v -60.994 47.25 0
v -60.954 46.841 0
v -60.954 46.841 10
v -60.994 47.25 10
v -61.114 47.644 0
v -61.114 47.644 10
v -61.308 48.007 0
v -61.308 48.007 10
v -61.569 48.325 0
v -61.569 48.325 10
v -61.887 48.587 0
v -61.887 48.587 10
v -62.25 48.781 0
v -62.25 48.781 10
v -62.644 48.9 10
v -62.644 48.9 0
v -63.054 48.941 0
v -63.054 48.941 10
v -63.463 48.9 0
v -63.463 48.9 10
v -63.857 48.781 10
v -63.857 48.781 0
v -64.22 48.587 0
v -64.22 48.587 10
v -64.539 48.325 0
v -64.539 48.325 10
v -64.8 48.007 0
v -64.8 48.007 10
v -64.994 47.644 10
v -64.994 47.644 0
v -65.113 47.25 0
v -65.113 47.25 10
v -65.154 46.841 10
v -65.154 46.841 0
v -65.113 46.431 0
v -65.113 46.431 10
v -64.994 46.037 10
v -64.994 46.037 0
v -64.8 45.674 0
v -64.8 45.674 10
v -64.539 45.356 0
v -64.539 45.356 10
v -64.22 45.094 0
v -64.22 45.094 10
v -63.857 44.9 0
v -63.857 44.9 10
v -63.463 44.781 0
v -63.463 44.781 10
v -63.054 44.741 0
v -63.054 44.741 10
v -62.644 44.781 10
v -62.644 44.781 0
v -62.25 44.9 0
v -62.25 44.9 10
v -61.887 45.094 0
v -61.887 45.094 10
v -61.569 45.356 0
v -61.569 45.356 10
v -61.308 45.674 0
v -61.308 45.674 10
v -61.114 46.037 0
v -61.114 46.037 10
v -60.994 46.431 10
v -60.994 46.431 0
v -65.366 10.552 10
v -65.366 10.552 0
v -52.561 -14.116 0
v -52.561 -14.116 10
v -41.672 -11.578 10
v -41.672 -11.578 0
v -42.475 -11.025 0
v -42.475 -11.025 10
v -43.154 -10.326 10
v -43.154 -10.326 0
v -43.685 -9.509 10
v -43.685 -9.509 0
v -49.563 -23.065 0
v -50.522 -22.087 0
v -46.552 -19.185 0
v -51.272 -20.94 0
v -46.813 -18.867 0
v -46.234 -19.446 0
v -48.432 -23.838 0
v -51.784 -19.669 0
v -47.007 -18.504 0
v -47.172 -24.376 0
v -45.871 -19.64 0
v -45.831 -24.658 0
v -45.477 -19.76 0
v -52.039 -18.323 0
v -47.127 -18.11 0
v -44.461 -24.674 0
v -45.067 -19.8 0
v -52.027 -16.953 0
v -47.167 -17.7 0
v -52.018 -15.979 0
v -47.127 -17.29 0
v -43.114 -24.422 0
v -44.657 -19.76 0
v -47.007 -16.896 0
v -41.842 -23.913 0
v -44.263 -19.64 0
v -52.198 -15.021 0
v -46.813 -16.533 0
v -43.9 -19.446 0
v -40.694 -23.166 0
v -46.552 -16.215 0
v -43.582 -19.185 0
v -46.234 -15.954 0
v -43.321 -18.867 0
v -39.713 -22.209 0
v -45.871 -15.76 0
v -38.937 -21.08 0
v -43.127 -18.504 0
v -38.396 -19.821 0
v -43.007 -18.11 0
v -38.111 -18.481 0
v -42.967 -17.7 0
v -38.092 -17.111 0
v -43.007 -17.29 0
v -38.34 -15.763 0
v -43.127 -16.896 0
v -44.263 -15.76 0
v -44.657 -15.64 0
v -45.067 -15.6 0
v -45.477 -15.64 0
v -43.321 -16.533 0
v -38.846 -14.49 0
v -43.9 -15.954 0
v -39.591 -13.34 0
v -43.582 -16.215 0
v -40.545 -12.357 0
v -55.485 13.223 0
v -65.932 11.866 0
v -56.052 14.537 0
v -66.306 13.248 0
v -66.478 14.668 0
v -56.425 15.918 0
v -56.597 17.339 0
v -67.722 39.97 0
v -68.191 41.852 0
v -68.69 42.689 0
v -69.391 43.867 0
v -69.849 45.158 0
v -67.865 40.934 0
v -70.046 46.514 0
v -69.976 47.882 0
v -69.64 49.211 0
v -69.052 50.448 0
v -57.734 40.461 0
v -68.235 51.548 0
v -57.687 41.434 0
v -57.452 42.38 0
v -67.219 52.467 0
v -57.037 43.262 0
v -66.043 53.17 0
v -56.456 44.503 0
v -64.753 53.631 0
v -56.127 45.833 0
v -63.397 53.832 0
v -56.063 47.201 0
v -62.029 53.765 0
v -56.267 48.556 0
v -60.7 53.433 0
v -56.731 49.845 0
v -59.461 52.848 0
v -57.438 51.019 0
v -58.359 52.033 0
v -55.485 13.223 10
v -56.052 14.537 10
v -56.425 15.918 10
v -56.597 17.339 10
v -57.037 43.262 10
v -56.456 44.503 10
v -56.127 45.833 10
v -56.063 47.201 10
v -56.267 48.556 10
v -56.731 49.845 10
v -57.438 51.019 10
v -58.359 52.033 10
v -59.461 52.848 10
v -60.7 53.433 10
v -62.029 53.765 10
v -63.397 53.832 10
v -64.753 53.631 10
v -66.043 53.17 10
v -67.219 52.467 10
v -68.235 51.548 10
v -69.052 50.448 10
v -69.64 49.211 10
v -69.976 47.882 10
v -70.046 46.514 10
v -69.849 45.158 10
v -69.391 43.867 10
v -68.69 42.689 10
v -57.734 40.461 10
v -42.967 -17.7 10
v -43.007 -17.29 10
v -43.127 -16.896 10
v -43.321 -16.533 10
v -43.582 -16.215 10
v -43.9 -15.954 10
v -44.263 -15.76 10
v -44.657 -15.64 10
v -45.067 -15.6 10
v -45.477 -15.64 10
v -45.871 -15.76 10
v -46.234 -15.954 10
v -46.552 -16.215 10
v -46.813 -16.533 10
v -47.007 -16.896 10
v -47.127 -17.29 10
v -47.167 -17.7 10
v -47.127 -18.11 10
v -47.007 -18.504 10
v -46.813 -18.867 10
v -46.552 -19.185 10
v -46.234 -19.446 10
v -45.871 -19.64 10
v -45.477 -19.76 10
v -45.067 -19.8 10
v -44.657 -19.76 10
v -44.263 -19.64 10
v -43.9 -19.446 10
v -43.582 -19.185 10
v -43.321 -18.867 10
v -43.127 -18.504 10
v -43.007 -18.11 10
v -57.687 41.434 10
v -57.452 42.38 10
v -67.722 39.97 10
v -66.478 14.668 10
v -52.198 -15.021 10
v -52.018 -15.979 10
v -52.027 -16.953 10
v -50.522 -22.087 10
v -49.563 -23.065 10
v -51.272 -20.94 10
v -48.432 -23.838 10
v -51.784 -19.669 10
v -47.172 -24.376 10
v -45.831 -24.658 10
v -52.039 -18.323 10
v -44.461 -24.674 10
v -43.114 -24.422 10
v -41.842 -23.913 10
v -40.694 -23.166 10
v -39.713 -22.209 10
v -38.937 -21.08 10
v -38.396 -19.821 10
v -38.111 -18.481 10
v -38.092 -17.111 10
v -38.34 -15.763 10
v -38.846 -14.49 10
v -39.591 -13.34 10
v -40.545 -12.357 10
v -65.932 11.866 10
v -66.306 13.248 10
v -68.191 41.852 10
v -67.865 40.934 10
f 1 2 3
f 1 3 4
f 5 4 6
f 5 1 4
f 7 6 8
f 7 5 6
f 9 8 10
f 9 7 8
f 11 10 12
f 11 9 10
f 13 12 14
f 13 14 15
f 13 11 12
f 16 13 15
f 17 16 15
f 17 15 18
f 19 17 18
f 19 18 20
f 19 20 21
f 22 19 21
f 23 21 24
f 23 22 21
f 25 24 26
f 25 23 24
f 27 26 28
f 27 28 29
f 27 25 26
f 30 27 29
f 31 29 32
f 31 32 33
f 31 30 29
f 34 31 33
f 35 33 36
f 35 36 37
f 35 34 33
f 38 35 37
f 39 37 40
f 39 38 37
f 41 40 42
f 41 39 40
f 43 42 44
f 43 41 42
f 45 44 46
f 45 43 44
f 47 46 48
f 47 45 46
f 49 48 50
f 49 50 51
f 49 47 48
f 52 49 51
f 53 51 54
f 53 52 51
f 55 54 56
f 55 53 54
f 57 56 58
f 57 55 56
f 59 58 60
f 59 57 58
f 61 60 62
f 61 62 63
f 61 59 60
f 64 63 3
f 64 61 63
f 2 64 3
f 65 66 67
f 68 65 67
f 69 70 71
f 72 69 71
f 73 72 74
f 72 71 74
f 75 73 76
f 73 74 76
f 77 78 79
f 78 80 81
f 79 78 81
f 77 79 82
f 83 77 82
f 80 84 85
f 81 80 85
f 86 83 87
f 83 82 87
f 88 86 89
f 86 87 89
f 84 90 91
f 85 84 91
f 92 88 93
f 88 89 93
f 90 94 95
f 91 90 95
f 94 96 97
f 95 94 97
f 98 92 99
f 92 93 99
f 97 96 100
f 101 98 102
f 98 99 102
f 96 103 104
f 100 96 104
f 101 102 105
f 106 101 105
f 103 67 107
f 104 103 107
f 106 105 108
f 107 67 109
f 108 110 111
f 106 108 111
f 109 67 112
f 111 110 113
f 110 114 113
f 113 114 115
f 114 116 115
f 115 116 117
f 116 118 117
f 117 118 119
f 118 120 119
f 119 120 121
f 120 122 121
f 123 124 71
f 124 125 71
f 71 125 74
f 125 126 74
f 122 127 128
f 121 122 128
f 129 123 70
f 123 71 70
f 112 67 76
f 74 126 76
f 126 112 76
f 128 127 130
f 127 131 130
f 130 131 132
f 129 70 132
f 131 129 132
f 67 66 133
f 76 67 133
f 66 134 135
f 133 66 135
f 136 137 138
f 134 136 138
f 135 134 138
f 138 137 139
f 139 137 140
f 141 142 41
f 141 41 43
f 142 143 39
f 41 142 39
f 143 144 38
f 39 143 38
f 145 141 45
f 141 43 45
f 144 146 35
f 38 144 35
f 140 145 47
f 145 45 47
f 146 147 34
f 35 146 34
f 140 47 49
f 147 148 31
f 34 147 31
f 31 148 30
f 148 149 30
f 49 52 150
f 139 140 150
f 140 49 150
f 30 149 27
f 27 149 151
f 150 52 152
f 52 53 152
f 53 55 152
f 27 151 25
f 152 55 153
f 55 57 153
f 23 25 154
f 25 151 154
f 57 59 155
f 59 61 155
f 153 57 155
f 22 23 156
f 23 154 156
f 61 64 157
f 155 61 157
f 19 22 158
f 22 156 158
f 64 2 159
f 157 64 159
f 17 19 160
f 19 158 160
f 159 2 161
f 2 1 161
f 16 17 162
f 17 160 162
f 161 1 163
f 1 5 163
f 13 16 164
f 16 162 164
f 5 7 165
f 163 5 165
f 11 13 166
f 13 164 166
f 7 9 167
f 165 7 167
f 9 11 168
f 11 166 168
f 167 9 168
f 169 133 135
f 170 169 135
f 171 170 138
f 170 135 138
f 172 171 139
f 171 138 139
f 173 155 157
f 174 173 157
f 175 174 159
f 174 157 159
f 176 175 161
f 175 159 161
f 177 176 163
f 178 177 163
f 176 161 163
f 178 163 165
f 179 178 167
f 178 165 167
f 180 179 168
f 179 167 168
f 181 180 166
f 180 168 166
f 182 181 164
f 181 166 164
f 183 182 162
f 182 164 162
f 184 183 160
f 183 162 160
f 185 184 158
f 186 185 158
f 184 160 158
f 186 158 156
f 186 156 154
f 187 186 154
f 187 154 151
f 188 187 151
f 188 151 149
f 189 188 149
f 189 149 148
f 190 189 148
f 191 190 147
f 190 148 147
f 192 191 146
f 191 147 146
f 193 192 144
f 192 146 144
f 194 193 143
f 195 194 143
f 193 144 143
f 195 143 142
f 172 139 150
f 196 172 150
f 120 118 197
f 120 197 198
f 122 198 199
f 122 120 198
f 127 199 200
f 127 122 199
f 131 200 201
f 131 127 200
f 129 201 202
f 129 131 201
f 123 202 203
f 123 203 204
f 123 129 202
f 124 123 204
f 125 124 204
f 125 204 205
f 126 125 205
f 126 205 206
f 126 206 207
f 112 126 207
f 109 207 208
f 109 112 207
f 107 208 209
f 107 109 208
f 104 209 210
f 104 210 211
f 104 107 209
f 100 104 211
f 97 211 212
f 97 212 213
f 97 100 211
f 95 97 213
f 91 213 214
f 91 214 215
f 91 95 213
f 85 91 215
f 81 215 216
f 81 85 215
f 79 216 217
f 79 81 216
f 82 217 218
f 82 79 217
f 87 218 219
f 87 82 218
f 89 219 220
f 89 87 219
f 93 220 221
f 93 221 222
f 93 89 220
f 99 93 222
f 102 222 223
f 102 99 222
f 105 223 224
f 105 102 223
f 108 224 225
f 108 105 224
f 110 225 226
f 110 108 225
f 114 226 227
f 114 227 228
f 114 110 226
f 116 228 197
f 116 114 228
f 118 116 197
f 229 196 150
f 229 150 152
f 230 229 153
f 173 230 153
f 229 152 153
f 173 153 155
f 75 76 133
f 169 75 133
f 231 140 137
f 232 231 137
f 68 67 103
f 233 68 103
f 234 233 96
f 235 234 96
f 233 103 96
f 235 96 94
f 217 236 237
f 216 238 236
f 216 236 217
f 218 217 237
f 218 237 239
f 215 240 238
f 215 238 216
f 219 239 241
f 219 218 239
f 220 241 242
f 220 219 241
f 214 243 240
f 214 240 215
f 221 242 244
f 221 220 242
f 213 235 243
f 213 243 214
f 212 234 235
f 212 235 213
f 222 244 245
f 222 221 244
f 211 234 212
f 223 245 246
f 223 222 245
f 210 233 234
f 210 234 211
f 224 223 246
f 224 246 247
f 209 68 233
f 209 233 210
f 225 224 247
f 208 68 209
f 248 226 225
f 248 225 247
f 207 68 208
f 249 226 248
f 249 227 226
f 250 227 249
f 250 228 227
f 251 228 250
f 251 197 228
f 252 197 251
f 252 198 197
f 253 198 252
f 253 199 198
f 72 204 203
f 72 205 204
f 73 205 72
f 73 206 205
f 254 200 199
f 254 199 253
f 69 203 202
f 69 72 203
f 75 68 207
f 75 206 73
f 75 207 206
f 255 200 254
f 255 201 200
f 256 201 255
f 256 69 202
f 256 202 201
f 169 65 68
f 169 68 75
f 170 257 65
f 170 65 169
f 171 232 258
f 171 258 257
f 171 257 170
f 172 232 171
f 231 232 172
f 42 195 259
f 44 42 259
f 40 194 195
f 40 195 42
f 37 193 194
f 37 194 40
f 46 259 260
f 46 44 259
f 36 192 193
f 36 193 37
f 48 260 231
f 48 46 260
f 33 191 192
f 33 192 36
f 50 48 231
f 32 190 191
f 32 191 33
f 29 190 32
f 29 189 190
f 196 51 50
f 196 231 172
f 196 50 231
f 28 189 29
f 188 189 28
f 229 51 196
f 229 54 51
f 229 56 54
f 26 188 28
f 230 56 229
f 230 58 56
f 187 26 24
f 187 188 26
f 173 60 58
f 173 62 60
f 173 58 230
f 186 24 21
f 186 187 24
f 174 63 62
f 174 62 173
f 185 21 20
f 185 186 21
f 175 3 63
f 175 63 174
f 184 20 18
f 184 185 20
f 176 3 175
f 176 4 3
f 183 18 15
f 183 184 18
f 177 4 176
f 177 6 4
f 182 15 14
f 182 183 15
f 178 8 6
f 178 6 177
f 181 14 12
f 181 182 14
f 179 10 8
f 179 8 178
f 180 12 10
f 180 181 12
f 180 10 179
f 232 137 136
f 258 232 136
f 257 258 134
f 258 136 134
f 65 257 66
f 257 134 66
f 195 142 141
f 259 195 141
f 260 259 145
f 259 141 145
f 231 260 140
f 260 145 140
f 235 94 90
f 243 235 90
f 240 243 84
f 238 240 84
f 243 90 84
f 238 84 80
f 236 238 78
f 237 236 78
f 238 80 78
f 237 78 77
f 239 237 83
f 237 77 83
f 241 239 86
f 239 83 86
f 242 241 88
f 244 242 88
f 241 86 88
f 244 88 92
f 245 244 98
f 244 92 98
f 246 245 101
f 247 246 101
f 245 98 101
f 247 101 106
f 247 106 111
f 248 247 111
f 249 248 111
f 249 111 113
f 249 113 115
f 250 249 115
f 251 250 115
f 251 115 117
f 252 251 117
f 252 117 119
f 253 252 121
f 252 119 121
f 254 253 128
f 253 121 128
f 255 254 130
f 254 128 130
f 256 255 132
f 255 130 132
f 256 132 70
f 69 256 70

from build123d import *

# Parameters (mm, degrees)
CROQUIS1_R              = 2.1
SALIENTE_EXTRUIR1_DEPTH = 10


with BuildPart() as part:
    # Croquis1 → Saliente-Extruir1 (new body)
    with BuildSketch(Plane.XY):
        with BuildLine():
            Line((-43.685266481, -9.509101851), (-55.484948694, 13.222697812))
            ThreePointArc((-55.484948694, 13.222697812), (-56.263095716, 15.220767285), (-56.597387965, 17.338795401))
            Line((-56.597387965, 17.338795401), (-57.734092582, 40.460761941))
            ThreePointArc((-57.734092582, 40.460761941), (-57.592357435, 41.912848633), (-57.037475041, 43.262200381))
            ThreePointArc((-57.037475041, 43.262200381), (-63.397480334, 53.832057006), (-68.690069236, 42.689344629))
            ThreePointArc((-68.690069236, 42.689344629), (-68.005510605, 41.40092523), (-67.722030303, 39.969742507))
            Line((-67.722030303, 39.969742507), (-66.478182752, 14.668357223))
            ThreePointArc((-66.478182752, 14.668357223), (-66.143890502, 12.550329107), (-65.365743481, 10.552259633))
            Line((-65.365743481, 10.552259633), (-52.560764931, -14.116218874))
            ThreePointArc((-52.560764931, -14.116218874), (-52.084712706, -15.495355776), (-52.027049902, -16.95320327))
            ThreePointArc((-52.027049902, -16.95320327), (-41.842018175, -23.912848963), (-41.672301733, -11.578233615))
            ThreePointArc((-41.672301733, -11.578233615), (-42.831358598, -10.692100558), (-43.685266481, -9.509101851))
        make_face()
        with Locations((-45.067, -17.7)):
            Circle(CROQUIS1_R, mode=Mode.SUBTRACT)
        with Locations((-63.053766888, 46.840500594)):
            Circle(CROQUIS1_R, mode=Mode.SUBTRACT)
    extrude(amount=SALIENTE_EXTRUIR1_DEPTH)


solid = part.part
